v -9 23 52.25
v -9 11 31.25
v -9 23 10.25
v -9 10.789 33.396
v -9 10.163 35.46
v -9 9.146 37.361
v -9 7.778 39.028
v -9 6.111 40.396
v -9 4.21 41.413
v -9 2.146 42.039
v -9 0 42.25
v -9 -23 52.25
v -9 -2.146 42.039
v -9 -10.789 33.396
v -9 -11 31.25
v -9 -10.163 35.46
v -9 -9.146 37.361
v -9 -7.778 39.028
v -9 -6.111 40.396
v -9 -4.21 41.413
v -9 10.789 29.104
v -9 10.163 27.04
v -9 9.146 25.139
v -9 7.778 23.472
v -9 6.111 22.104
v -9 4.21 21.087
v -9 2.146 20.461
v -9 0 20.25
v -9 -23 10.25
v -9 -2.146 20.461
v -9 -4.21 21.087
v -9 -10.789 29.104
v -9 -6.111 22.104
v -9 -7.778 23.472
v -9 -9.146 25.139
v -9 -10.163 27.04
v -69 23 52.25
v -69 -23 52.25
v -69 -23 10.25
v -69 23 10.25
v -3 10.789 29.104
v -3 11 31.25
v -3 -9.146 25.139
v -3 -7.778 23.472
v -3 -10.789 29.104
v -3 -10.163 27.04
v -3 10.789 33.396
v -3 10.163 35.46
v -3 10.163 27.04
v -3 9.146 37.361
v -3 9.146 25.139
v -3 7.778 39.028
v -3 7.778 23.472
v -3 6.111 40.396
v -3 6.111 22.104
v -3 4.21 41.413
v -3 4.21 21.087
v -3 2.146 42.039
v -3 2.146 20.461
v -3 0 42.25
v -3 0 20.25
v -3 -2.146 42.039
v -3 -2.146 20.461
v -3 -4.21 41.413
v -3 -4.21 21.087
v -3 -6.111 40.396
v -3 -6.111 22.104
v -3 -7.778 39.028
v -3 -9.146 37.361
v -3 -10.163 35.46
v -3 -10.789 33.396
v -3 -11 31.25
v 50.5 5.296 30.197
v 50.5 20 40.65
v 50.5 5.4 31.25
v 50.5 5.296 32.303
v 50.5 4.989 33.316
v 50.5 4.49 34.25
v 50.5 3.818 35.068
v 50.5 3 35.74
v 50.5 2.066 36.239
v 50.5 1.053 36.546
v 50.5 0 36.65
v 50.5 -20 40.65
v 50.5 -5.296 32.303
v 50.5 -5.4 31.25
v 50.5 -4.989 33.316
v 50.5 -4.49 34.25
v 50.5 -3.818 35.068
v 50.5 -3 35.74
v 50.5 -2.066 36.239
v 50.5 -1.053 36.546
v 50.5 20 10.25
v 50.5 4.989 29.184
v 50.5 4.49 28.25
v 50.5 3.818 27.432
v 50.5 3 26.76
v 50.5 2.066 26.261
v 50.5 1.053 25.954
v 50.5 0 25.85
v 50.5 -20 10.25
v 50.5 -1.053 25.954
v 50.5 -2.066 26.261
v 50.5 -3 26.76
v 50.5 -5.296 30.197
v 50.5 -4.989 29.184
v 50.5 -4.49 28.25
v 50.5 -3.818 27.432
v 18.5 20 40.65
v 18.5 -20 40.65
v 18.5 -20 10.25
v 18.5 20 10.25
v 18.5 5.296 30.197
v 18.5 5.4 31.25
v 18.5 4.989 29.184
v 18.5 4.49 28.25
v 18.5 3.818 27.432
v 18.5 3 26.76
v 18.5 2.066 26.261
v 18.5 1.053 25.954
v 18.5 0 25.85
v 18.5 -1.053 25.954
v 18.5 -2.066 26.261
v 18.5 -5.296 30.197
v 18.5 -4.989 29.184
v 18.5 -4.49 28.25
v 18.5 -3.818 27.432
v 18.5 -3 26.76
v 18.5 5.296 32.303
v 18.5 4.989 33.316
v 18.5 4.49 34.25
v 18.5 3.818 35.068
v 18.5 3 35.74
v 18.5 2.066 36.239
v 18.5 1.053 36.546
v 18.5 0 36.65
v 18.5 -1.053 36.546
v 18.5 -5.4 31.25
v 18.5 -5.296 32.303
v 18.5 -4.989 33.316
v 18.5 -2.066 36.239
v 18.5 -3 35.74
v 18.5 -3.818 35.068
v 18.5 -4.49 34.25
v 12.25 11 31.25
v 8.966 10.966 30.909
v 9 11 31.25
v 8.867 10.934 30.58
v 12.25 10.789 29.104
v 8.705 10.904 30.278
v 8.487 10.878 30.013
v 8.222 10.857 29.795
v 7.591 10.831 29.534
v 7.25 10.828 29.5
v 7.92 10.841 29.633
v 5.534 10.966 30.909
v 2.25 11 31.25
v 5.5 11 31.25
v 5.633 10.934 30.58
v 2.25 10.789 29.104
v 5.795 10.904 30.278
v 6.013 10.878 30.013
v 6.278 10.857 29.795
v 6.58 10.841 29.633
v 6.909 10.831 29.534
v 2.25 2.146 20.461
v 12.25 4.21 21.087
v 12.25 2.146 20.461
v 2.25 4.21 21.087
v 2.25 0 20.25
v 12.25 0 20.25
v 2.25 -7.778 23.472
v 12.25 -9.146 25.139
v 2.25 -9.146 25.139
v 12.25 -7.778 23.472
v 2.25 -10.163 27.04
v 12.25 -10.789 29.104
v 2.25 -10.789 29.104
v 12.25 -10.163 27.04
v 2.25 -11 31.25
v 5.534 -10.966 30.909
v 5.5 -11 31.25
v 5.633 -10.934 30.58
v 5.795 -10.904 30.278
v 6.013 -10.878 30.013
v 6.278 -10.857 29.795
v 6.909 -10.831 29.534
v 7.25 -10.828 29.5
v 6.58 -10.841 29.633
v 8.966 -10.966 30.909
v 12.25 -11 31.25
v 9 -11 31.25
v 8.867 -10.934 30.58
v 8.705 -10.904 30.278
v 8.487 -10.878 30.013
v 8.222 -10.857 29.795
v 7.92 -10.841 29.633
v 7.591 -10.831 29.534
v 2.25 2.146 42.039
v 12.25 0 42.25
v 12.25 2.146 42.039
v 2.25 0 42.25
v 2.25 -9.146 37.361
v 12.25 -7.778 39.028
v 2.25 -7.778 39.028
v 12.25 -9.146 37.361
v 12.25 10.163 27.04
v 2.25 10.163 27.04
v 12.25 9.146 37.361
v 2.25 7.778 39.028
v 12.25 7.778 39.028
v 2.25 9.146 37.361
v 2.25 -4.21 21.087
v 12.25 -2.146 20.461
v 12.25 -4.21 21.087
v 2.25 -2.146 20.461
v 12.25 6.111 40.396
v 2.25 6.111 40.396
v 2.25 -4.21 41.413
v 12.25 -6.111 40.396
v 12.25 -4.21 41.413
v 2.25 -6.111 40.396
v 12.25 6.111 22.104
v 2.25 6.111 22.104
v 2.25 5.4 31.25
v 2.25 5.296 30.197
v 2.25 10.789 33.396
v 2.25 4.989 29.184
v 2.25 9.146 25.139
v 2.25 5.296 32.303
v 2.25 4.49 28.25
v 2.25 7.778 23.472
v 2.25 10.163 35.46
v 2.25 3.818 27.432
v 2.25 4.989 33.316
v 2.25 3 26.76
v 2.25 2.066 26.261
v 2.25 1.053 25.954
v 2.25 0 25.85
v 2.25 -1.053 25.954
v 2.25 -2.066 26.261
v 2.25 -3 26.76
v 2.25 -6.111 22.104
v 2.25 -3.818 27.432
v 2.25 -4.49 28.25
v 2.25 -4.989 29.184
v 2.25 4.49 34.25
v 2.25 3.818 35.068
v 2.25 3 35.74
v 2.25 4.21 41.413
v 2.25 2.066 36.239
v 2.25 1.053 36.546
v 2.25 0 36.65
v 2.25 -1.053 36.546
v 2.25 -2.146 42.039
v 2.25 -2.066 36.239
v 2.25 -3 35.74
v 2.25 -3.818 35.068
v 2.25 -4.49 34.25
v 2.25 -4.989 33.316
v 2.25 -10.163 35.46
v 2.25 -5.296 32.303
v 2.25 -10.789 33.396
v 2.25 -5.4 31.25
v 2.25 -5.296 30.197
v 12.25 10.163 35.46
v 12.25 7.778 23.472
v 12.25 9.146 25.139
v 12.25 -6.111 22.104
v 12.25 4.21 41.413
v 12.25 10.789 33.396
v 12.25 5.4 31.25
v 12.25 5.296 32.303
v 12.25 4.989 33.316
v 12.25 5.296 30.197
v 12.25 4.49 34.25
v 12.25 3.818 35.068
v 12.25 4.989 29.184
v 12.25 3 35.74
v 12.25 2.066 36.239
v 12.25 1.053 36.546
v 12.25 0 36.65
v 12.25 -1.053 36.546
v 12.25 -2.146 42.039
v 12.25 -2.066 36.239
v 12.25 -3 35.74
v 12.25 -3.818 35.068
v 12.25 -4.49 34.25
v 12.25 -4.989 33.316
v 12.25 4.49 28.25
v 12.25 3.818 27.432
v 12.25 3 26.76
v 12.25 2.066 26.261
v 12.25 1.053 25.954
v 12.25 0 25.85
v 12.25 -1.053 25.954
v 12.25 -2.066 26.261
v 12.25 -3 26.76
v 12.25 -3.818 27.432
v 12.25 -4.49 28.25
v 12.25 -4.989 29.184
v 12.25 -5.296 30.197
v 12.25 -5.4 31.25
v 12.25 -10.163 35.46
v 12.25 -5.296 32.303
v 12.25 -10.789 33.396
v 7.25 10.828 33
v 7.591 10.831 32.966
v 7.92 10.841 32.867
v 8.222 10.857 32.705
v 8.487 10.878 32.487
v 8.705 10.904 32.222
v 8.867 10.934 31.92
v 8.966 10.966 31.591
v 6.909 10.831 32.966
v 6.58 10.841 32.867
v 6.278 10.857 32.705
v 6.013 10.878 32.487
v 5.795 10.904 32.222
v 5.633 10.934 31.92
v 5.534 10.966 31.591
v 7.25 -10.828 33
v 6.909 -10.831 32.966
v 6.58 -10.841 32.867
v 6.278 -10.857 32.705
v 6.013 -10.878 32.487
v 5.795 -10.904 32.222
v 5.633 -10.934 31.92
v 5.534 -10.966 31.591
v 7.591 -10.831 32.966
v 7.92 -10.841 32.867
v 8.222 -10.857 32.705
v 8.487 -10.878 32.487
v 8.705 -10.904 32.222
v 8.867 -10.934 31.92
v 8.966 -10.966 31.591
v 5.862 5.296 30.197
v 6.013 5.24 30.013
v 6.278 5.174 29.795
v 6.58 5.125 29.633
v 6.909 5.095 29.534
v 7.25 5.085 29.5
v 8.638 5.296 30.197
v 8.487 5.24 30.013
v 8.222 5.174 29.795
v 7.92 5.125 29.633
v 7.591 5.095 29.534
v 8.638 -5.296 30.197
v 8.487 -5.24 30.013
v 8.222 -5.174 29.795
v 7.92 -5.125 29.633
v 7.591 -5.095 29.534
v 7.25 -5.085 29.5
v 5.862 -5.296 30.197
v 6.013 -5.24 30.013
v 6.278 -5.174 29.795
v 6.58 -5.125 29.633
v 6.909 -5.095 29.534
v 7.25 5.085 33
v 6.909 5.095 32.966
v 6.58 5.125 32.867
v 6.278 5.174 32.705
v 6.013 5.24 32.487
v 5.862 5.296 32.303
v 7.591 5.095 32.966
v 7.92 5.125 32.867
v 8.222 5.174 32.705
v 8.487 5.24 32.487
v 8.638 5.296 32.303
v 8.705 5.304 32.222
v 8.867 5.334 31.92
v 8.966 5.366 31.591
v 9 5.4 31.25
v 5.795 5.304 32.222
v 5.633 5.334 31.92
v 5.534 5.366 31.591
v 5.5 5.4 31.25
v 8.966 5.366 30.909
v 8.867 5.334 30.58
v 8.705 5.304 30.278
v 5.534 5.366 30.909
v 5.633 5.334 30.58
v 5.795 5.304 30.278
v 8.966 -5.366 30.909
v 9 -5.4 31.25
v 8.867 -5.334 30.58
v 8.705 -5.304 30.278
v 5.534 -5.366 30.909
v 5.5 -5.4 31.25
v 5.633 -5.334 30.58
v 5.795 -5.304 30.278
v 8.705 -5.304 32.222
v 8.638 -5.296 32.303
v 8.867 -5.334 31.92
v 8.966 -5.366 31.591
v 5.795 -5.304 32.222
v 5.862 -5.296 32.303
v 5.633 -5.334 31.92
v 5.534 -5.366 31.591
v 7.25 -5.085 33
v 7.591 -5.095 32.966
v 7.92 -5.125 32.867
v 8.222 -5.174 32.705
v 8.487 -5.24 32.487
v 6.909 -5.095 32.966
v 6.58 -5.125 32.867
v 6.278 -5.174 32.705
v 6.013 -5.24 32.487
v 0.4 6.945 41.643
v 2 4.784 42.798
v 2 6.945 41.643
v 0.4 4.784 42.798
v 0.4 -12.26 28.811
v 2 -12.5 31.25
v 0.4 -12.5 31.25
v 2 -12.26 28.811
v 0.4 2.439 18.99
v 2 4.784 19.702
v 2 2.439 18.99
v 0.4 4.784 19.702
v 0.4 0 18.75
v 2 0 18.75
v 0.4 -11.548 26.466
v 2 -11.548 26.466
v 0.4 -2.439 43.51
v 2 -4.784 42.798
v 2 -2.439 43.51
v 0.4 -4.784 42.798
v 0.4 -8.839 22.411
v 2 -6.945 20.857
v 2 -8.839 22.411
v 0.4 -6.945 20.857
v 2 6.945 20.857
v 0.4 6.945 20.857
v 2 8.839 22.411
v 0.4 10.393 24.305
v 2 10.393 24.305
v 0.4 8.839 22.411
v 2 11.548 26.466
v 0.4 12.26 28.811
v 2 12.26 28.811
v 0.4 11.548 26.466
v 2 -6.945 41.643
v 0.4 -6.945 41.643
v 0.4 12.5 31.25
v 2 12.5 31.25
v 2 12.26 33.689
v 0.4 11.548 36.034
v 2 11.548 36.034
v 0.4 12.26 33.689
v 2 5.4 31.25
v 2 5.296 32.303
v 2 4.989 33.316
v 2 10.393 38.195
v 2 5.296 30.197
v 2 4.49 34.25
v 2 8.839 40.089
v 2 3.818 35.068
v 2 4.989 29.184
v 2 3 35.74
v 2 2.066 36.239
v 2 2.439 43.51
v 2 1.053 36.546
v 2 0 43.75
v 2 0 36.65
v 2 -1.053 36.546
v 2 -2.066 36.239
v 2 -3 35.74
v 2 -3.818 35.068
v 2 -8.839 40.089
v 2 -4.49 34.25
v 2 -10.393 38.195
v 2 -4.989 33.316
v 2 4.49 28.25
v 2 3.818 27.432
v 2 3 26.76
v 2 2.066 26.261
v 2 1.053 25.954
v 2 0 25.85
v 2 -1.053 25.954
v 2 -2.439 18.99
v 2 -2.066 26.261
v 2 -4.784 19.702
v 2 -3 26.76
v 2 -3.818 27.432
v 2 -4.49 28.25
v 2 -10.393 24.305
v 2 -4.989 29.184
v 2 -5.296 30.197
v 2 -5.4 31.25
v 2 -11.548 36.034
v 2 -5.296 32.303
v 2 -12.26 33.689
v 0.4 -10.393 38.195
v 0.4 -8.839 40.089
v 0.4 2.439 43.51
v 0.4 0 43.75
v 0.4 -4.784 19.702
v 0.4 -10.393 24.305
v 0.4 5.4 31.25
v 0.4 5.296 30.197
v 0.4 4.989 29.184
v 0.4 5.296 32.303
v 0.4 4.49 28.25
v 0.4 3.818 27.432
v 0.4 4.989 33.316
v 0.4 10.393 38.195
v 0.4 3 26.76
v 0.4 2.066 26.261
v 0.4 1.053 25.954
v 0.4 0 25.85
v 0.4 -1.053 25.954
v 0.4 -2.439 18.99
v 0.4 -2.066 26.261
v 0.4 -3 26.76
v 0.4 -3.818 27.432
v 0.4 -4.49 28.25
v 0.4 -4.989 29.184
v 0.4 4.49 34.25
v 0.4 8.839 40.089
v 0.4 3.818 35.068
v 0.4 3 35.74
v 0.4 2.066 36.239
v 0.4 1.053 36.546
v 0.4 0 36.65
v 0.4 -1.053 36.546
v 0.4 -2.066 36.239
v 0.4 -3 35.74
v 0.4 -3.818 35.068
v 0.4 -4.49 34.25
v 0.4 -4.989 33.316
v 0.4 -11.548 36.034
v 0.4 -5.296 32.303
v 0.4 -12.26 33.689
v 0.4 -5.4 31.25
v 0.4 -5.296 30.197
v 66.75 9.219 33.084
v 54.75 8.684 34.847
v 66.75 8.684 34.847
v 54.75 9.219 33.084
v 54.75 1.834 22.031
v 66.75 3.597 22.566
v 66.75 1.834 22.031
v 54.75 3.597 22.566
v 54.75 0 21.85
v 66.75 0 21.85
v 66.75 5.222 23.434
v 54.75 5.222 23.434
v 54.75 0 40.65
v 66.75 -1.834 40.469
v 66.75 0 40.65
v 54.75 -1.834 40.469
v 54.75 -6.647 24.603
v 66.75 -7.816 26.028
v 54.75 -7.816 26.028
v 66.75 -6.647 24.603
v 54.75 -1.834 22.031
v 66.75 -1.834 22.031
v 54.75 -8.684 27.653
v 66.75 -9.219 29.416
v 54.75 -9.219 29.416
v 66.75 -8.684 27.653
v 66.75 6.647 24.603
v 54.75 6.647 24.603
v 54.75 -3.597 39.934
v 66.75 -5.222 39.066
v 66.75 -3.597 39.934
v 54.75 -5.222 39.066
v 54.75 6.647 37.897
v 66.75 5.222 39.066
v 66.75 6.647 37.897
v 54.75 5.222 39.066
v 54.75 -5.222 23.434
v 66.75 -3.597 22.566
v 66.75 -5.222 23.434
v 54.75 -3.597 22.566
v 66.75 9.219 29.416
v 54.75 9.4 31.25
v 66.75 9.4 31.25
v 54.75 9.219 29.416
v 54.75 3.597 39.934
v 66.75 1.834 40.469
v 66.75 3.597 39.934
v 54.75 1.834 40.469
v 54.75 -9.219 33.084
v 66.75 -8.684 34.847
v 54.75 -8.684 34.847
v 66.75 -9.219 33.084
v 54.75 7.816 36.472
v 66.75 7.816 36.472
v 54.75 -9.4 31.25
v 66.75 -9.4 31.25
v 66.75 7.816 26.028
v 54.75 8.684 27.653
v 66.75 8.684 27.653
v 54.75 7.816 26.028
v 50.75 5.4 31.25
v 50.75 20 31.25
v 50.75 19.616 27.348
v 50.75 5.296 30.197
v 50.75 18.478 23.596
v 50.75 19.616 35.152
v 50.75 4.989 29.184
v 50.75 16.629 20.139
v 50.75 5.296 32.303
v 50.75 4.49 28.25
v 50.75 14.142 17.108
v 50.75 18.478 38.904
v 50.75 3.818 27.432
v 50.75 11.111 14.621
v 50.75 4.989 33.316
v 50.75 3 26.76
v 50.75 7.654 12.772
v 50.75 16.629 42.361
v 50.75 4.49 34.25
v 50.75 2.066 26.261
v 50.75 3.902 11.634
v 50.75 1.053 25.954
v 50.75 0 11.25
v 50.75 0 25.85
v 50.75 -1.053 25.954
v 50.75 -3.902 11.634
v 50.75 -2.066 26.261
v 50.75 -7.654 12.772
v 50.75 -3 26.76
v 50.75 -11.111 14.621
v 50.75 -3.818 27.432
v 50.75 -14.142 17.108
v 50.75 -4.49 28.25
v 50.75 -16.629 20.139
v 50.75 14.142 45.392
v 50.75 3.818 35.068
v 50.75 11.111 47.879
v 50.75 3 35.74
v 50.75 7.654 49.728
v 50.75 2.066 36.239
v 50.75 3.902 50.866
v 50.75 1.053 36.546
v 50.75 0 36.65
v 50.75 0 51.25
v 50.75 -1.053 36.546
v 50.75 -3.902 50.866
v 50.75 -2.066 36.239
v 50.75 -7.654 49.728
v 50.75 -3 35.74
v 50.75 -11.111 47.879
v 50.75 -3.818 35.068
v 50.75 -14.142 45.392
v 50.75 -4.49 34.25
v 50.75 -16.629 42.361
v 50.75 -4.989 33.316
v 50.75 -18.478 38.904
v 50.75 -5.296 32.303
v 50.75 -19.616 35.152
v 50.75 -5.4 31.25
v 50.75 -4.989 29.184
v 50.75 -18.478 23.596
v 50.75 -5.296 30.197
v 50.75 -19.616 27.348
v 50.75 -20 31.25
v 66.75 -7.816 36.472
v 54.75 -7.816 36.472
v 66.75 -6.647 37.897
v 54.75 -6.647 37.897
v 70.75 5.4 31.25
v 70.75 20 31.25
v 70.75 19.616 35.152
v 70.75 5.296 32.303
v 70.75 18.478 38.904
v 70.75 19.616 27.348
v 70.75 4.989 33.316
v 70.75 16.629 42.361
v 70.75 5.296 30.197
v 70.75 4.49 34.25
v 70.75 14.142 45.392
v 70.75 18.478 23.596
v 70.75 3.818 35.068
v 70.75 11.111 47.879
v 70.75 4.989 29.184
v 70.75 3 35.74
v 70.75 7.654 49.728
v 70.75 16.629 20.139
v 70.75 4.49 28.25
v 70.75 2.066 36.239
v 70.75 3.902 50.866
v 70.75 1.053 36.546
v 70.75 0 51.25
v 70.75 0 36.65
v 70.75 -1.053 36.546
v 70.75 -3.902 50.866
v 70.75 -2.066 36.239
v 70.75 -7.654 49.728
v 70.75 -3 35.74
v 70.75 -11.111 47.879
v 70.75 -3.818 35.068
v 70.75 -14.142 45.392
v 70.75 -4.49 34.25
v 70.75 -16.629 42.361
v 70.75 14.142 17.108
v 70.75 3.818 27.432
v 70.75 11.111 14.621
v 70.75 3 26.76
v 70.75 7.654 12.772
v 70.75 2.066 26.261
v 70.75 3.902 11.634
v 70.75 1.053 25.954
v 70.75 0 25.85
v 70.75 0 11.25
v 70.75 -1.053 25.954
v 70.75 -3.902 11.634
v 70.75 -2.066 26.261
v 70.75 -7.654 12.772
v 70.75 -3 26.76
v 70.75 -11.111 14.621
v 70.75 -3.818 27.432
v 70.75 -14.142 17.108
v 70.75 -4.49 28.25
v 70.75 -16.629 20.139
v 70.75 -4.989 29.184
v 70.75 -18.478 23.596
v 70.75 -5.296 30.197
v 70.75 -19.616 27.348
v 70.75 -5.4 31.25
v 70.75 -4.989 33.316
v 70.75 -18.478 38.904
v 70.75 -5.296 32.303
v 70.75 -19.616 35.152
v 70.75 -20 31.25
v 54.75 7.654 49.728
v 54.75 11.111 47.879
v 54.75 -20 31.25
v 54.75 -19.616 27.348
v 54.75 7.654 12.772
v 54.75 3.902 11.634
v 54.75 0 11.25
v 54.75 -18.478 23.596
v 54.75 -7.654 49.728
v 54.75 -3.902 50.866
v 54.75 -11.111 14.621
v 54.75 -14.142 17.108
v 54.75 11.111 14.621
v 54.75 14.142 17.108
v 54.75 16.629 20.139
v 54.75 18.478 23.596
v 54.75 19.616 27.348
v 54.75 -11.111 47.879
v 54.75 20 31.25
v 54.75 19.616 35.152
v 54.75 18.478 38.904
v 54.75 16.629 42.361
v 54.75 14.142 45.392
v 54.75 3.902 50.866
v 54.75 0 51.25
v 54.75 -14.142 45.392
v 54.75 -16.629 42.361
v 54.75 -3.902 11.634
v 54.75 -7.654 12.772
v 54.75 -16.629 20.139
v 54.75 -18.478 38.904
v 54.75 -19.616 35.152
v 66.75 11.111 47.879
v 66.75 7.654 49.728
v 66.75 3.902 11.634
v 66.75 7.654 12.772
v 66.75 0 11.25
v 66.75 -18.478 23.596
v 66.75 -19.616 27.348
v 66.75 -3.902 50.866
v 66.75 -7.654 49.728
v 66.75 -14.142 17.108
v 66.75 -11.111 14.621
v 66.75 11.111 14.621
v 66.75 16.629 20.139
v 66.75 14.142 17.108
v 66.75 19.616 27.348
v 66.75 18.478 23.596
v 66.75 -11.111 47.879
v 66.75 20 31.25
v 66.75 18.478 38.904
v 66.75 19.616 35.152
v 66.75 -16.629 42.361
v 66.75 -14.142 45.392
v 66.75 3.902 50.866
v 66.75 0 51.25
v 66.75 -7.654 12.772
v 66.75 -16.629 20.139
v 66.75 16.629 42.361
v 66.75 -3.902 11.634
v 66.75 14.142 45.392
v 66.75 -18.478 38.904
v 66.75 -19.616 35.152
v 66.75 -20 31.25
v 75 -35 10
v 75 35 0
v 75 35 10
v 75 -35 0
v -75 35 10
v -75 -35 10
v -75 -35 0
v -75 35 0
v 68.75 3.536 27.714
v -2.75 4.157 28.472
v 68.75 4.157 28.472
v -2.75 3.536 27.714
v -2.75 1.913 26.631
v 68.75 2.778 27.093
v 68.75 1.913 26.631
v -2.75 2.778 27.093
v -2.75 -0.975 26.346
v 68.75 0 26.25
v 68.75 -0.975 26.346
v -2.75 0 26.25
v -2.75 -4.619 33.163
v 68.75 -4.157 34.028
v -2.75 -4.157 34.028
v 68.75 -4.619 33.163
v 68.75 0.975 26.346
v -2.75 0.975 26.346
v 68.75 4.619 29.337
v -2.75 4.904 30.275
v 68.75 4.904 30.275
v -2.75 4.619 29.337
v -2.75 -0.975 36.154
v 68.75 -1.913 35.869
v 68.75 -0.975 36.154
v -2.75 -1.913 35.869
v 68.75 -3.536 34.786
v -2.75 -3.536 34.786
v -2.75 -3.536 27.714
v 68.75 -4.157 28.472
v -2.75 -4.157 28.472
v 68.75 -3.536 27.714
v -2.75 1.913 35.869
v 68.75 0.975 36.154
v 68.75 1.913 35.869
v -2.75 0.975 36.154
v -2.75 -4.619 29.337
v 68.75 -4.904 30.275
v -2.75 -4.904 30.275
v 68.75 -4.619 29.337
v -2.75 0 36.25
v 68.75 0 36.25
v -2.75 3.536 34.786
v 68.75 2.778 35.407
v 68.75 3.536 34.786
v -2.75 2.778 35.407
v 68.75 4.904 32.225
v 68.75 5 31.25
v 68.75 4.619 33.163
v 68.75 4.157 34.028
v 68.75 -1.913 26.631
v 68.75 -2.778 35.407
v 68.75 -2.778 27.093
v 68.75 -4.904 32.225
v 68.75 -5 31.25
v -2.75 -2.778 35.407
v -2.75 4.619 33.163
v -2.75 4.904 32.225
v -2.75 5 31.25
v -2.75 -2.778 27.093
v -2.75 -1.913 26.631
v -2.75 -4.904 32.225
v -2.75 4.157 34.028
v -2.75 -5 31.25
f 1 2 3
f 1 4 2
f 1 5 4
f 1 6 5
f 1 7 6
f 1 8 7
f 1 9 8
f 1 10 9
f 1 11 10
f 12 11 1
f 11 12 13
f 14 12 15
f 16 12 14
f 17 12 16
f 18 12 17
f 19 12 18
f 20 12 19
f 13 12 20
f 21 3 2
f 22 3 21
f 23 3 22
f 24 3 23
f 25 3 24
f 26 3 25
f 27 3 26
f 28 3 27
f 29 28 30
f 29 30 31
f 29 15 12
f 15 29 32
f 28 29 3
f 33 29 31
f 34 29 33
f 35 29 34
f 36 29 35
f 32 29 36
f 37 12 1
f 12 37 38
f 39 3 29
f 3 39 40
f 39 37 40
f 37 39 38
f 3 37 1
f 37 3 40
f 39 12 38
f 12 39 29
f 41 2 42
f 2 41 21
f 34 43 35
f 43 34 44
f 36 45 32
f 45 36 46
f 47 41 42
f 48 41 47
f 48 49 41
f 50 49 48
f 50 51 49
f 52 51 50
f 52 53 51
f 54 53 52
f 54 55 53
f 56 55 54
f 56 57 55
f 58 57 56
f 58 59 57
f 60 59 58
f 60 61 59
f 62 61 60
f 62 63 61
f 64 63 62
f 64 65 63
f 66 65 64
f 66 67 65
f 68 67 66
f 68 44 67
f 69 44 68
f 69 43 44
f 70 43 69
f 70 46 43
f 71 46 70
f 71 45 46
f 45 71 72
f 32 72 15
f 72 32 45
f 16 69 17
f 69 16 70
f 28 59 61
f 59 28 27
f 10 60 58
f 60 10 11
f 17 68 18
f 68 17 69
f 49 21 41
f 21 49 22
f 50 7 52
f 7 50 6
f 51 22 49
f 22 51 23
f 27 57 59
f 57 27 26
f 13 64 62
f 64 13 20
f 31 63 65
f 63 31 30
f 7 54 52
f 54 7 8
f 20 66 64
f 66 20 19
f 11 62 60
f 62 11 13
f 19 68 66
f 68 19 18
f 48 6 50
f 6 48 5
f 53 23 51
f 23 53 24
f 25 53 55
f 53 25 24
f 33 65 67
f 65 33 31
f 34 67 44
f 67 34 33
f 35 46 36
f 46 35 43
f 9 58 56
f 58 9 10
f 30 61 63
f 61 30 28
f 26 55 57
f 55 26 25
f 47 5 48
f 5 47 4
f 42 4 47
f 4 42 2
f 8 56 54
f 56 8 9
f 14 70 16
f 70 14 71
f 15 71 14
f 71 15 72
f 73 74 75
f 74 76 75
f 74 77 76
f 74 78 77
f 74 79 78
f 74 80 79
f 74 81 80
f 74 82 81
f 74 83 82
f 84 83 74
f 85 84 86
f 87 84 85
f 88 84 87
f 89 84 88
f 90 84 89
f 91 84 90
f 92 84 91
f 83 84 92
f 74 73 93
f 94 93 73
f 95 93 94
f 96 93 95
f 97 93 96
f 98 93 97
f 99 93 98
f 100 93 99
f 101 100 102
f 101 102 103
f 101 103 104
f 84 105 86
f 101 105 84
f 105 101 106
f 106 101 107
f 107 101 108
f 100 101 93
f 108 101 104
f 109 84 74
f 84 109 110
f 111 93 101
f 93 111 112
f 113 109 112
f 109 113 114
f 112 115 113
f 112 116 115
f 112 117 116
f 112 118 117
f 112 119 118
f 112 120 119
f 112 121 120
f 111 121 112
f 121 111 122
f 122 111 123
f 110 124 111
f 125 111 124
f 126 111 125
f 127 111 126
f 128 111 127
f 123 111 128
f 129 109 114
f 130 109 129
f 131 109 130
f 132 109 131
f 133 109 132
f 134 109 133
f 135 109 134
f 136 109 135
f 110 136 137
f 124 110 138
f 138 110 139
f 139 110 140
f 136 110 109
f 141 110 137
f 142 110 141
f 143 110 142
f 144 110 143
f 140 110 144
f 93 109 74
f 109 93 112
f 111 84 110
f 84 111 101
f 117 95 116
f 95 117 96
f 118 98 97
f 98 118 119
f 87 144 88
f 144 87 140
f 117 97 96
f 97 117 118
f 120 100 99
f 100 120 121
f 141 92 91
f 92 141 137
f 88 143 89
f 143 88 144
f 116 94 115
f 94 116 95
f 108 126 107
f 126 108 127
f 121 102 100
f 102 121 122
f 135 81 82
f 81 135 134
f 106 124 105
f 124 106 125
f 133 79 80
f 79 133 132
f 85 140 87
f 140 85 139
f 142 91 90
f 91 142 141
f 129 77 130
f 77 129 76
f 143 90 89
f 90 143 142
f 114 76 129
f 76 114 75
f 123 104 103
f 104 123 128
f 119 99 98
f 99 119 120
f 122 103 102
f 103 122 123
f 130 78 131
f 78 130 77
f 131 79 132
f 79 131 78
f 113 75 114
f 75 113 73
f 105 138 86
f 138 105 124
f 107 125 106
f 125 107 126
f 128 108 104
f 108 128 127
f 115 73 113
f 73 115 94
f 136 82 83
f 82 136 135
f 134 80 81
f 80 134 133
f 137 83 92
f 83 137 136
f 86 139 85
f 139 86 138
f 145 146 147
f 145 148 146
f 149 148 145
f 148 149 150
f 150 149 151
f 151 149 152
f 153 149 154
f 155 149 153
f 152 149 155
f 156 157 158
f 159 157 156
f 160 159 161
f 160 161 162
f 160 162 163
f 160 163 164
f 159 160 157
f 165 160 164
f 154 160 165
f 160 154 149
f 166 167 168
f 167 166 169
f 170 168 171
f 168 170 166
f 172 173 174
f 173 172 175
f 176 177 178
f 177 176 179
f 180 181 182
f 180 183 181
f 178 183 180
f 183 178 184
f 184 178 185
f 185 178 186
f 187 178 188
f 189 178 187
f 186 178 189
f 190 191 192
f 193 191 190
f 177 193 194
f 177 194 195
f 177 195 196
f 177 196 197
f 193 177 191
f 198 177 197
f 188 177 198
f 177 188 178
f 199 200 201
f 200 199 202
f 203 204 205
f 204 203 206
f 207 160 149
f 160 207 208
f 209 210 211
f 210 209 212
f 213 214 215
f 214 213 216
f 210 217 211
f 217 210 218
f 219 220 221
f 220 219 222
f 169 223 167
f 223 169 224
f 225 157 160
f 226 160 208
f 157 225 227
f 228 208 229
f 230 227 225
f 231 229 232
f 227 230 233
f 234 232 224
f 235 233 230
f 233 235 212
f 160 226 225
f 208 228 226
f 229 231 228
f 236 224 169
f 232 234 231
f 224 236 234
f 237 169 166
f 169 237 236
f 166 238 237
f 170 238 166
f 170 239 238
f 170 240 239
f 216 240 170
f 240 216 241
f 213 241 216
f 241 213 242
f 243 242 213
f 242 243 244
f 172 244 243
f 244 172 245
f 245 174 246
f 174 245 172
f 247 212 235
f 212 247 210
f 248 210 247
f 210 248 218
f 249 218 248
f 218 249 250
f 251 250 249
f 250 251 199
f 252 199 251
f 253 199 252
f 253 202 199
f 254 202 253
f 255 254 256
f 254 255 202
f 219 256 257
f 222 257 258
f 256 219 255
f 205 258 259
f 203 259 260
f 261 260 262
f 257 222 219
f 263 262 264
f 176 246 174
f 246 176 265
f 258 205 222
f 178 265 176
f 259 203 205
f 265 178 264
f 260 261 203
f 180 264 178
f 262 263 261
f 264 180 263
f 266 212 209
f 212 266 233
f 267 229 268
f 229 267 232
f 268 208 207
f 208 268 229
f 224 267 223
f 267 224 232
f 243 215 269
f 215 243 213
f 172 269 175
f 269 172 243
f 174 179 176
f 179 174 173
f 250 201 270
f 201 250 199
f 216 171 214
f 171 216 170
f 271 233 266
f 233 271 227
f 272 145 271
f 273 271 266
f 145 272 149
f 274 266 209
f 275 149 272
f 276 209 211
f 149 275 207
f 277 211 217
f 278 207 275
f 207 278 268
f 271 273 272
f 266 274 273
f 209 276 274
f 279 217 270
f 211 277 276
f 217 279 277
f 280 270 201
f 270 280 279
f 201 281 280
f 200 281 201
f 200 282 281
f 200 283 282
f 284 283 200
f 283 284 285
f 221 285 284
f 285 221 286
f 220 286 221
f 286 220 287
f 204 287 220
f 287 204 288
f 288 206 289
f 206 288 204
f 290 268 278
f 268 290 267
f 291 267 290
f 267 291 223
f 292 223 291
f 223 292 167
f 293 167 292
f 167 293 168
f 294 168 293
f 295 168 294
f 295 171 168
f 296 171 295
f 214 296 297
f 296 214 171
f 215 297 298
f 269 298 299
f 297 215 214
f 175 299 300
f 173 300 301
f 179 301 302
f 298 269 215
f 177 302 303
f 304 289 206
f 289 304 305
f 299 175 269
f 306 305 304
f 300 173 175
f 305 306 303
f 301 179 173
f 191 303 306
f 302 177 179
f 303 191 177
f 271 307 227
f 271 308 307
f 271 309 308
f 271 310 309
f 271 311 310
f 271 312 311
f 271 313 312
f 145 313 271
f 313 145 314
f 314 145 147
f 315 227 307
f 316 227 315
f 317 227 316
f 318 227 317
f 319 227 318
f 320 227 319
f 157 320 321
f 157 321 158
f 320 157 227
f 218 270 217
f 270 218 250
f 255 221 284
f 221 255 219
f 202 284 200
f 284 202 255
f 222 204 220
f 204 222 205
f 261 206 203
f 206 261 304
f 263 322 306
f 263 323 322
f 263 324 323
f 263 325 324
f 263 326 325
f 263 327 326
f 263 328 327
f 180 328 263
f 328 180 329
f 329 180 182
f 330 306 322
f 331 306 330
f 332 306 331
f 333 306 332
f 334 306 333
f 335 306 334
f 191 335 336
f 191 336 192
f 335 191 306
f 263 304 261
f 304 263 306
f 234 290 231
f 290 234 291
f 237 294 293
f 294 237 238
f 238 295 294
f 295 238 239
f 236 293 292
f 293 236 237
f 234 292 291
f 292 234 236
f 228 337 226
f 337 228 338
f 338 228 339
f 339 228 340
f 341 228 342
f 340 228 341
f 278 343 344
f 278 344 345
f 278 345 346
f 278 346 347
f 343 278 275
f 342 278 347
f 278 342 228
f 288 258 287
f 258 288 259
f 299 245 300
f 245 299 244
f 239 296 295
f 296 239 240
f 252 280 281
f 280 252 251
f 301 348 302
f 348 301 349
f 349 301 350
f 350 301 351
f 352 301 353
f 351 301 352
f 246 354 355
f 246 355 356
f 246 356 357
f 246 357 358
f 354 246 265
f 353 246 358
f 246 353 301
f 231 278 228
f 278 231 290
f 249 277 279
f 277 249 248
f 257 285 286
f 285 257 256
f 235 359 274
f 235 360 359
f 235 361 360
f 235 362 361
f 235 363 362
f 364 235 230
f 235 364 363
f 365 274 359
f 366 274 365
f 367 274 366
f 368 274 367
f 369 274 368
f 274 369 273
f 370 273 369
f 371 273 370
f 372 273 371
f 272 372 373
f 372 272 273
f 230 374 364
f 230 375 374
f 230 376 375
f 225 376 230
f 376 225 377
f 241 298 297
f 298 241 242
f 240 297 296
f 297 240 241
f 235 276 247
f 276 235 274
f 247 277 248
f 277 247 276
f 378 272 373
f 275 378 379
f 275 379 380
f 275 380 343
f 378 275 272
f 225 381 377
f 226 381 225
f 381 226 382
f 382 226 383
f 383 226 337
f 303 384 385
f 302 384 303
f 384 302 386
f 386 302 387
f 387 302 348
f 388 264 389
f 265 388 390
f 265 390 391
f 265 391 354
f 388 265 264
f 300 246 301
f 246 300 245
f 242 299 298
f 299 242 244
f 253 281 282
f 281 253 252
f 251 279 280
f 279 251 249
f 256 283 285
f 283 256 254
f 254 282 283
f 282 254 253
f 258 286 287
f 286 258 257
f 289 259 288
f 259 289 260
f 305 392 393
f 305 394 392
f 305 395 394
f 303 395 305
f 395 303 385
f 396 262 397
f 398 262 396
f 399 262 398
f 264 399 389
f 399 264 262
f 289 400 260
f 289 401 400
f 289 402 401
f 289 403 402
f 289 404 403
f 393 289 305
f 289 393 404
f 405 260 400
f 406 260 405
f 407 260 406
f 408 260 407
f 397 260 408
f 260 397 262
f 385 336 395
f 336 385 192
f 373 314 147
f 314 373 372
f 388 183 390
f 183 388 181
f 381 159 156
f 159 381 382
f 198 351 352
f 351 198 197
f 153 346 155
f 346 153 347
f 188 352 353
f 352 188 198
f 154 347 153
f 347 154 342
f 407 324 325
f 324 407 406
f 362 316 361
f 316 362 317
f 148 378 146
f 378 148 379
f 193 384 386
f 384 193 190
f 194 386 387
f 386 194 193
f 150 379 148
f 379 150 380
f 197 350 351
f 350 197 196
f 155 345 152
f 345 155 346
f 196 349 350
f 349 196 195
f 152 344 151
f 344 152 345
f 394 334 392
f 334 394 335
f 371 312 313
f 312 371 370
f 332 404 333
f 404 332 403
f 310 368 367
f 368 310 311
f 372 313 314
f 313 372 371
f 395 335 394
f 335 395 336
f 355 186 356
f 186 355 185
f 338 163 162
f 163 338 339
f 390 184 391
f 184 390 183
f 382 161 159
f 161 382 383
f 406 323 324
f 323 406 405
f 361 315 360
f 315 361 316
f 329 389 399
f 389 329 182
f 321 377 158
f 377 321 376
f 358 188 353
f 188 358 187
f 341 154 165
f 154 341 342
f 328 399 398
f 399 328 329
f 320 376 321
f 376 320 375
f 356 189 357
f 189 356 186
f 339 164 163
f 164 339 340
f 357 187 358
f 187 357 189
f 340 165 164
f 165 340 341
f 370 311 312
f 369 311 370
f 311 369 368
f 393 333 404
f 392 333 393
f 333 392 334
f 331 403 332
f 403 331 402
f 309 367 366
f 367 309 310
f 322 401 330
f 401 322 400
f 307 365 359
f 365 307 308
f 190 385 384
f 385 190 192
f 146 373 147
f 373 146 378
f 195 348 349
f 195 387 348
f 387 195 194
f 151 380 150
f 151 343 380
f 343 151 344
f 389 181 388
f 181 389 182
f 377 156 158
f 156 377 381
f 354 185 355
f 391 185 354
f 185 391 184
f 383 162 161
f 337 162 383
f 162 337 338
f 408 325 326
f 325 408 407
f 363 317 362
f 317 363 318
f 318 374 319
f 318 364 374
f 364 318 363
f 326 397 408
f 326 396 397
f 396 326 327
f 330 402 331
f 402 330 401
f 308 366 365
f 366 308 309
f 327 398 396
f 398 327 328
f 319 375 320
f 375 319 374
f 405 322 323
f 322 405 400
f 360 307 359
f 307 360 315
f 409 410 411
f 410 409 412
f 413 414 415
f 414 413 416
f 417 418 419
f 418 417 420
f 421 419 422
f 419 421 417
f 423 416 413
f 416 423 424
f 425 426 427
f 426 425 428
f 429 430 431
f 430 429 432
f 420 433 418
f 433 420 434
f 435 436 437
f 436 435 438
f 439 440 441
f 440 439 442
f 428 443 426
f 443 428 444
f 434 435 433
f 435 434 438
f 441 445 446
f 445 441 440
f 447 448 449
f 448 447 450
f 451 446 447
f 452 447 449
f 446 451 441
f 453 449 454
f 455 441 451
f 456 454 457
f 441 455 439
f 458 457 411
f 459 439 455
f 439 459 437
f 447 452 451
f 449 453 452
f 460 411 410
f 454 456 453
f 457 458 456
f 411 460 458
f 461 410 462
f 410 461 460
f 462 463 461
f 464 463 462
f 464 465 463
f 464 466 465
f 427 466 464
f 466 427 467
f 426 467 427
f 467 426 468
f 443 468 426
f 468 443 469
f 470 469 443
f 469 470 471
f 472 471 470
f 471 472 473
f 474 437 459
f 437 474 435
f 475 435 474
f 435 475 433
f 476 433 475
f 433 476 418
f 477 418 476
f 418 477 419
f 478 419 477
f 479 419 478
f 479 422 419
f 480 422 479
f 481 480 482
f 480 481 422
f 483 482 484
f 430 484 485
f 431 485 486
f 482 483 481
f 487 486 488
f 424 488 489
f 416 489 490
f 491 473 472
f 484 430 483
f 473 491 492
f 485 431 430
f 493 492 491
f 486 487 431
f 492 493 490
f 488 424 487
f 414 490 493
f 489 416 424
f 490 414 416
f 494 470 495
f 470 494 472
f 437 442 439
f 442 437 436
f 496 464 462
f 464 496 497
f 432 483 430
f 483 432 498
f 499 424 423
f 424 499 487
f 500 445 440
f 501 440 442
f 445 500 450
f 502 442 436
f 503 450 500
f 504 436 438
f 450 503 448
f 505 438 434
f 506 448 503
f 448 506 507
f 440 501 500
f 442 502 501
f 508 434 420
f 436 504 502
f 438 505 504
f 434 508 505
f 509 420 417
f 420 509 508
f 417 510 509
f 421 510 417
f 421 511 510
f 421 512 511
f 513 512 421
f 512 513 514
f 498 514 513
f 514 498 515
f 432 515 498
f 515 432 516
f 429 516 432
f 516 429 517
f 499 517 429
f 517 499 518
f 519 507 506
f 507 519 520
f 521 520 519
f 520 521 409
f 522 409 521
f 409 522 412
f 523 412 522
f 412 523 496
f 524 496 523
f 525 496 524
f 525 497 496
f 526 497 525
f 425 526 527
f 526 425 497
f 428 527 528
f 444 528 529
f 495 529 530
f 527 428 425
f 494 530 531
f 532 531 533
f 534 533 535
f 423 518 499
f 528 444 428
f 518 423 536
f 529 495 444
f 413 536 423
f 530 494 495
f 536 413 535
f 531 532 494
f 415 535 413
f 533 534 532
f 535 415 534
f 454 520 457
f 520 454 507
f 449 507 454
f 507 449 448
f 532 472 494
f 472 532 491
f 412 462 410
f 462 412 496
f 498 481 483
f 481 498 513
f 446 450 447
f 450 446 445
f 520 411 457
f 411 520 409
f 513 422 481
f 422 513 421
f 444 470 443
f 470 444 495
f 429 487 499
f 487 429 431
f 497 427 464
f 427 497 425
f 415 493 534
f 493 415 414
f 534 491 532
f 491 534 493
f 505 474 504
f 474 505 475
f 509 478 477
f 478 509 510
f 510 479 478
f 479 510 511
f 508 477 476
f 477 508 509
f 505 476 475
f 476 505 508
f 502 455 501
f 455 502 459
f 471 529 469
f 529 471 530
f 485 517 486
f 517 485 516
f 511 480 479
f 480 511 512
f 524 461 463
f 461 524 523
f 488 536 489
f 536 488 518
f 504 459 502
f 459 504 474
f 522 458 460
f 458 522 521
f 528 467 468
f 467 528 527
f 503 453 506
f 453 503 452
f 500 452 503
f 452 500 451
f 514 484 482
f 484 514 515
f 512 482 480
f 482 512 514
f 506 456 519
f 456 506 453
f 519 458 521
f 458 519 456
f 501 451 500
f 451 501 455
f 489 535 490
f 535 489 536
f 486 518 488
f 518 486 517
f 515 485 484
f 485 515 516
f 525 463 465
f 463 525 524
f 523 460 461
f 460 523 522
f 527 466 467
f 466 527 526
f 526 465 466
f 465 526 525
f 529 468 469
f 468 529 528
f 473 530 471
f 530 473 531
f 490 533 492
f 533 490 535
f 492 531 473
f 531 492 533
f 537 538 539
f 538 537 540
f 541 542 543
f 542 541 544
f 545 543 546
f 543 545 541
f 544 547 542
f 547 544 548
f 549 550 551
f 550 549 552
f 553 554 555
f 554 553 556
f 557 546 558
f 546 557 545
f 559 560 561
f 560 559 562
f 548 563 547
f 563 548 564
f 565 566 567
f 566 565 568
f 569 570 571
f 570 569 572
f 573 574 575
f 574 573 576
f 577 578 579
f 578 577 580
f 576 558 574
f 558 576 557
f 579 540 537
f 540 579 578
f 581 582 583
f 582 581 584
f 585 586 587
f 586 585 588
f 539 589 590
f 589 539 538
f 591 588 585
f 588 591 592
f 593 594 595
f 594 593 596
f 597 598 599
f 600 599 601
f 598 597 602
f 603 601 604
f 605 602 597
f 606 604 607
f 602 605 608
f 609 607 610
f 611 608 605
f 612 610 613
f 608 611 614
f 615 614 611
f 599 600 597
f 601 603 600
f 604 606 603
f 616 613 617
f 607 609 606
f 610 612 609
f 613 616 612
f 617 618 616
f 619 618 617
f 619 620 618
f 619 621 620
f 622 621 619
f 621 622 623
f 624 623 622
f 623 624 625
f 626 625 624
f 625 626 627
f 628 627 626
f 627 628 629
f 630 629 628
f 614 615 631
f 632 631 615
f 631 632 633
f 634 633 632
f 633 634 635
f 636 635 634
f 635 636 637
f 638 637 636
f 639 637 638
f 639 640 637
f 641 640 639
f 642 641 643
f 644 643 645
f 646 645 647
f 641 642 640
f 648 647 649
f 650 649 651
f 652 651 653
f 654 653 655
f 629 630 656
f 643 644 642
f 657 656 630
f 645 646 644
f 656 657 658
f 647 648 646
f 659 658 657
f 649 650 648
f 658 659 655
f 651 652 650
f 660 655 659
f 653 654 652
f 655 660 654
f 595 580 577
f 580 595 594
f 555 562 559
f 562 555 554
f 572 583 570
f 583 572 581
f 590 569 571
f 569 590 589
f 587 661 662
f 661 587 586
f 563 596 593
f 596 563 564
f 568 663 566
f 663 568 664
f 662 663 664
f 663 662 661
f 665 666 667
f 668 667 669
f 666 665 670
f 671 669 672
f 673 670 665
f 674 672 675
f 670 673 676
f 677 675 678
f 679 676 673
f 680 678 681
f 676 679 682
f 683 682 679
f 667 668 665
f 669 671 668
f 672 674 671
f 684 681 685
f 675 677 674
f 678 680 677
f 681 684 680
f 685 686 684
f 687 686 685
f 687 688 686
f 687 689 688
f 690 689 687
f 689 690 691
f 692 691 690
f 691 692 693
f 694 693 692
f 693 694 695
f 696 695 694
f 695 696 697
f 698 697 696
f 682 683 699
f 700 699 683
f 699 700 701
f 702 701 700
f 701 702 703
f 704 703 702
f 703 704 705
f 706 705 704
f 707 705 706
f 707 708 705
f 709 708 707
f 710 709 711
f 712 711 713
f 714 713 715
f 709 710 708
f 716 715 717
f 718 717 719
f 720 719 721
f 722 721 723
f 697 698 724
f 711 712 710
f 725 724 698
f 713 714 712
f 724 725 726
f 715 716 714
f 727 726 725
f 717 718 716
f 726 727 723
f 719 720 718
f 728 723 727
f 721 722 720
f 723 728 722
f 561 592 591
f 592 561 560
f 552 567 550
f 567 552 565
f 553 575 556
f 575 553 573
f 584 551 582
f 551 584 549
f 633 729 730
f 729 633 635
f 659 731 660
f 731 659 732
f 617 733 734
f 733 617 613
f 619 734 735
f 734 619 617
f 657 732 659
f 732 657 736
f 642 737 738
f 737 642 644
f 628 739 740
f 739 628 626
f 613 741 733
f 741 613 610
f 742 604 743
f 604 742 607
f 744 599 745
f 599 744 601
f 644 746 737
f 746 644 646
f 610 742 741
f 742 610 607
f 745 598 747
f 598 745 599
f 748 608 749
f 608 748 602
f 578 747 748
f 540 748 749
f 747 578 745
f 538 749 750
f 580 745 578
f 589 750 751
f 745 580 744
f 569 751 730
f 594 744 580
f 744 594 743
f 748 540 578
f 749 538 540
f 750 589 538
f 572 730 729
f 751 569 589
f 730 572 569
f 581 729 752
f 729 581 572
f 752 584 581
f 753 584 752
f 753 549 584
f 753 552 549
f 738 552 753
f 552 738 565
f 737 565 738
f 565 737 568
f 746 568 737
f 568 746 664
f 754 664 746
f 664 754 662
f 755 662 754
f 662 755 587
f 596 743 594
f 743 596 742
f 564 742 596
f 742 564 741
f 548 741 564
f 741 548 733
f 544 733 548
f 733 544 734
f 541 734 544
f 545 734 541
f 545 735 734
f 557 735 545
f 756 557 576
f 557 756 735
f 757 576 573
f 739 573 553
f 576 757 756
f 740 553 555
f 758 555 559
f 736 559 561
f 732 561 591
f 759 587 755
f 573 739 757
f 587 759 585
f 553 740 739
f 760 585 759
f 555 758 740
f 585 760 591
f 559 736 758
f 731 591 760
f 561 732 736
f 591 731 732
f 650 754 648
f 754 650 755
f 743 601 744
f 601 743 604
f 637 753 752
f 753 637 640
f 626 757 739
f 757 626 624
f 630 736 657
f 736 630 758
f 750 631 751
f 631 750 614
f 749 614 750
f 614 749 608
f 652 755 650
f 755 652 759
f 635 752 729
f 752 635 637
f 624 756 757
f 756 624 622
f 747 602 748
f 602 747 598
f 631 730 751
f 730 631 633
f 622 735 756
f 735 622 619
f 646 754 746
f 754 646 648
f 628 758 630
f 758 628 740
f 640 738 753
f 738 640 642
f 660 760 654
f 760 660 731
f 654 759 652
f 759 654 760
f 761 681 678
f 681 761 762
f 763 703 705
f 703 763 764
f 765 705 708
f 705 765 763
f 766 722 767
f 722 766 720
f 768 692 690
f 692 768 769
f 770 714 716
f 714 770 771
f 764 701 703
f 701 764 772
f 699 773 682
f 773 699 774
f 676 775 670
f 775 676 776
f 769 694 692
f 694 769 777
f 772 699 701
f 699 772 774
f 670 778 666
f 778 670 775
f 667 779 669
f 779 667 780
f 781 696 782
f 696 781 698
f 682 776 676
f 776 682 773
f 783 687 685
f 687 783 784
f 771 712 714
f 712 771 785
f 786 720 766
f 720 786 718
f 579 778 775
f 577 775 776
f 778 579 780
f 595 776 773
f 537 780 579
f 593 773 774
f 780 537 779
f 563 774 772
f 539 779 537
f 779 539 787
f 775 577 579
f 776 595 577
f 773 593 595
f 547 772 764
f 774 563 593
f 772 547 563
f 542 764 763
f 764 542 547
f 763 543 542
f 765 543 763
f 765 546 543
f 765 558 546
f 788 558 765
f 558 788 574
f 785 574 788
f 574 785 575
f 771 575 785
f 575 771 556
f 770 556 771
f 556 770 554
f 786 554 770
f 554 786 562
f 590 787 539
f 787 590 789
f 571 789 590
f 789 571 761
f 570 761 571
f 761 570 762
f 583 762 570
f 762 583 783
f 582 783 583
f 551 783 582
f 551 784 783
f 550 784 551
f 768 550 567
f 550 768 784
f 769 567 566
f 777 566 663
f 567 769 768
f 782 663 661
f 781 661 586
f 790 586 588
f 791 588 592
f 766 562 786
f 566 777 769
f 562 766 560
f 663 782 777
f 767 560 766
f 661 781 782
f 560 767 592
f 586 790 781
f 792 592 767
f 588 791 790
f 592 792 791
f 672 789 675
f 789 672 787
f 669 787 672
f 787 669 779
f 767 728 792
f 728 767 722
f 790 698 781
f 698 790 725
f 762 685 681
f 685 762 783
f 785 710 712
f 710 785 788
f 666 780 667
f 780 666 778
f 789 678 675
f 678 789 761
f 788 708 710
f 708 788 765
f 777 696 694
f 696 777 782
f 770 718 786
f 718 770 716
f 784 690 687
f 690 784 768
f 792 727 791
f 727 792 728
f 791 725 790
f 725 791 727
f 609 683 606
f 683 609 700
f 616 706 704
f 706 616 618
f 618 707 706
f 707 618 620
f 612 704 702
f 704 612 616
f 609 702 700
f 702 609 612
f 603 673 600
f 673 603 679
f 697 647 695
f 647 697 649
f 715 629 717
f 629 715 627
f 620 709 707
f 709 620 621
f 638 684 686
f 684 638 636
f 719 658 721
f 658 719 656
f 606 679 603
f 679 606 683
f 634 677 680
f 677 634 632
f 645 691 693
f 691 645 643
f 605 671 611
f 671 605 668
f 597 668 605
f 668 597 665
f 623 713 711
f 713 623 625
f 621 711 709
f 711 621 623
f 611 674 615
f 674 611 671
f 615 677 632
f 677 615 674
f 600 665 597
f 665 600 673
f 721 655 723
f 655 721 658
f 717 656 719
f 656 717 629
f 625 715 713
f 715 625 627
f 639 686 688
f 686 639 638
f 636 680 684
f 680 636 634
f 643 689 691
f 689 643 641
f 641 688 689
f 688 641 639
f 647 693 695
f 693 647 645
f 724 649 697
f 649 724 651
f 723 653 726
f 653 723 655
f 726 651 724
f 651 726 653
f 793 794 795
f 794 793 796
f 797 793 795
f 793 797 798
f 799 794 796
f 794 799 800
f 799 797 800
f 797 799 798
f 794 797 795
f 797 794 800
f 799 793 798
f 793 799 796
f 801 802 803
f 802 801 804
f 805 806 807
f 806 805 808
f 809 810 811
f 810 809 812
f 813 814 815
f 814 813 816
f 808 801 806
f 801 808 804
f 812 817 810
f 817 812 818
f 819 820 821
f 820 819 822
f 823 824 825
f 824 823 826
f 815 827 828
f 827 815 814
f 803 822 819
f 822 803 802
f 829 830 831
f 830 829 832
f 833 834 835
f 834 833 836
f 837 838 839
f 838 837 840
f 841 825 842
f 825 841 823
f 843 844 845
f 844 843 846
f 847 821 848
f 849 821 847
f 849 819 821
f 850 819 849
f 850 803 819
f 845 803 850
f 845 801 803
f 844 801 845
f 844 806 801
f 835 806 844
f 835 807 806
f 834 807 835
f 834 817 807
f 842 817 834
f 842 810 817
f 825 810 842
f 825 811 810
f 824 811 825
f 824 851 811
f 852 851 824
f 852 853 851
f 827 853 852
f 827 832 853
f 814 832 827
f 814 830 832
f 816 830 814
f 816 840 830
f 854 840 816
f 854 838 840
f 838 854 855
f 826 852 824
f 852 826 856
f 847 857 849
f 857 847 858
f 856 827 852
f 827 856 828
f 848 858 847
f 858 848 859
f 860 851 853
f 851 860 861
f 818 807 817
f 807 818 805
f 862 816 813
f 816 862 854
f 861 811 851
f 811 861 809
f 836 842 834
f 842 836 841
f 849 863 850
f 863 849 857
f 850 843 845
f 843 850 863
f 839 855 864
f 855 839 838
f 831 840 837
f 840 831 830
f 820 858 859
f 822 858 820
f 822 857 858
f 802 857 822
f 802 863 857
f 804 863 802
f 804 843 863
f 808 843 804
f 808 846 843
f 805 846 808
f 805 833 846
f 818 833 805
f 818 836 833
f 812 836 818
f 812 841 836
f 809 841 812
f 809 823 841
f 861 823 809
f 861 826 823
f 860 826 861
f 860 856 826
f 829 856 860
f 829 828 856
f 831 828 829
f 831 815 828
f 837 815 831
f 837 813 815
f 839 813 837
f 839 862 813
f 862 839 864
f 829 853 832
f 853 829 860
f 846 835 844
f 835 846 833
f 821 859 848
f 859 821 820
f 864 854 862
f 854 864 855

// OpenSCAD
$fn = 32;

// ------------------------------------------------------------------------
// Motor drive station: motor 60 x 42 mm, shaft d10, pulley d40
// Every part is its own module, assembly() places every instance.
// ------------------------------------------------------------------------

// --- part 1 ---
module station_bed() {
  difference() {
    translate([-75, -35, 0]) cube([150, 70, 10]);
  }
}

// --- part 2 ---
module drive_motor() {
  union() {
    translate([-30, -23, 0]) cube([60, 46, 42]);
    translate([33, 0, 21]) rotate([0, 90, 0]) cylinder(h = 6, d = 22, center = true);
  }
}

// --- part 3 ---
module pillow_block() {
  difference() {
    translate([-16, -20, 0]) cube([32, 40, 30.4]);
    translate([0, 0, 21]) rotate([0, 90, 0]) cylinder(h = 34, d = 10.8, center = true);
  }
}

// --- part 4 ---
module drive_shaft() {
  translate([0, 0, -35.75]) cylinder(h = 71.5, d = 10);
}

// --- part 5 ---
module shaft_collar() {
  difference() {
    cylinder(h = 10, d = 22);
    translate([0, 0, -1]) cylinder(h = 12, d = 10.8);
    translate([0, 0, 5]) rotate([90, 0, 0]) cylinder(h = 24, d = 3.5, center = true);
  }
}

// --- part 6 ---
module collar_washer() {
  difference() {
      translate([0, 0, 0]) cylinder(h = 1.6, d = 25);
      translate([0, 0, -1]) cylinder(h = 3.6, d = 10.8);
    }
}

// --- part 7 ---
module drive_pulley() {
  difference() {
    union() {
      cylinder(h = 20, d = 18.8);
      cylinder(h = 4, d = 40);
      translate([0, 0, 16]) cylinder(h = 4, d = 40);
    }
    translate([0, 0, -1]) cylinder(h = 22, d = 10.8);
  }
}

// --- assembly ---
module assembly() {
  color([0.80, 0.24, 0.20]) translate([0, 0, 0]) rotate([0, 0, 0]) station_bed();
  color([0.20, 0.45, 0.75]) translate([-39, 0, 10.25]) rotate([0, 0, 0]) drive_motor();
  color([0.25, 0.62, 0.32]) translate([34.5, 0, 10.25]) rotate([0, 0, 0]) pillow_block();
  color([0.92, 0.70, 0.18]) translate([33, 0, 31.25]) rotate([0, 90, 0]) drive_shaft();
  color([0.58, 0.35, 0.70]) translate([2.25, 0, 31.25]) rotate([0, 90, 0]) shaft_collar();
  color([0.16, 0.66, 0.66]) translate([0.4, 0, 31.25]) rotate([0, 90, 0]) collar_washer();
  color([0.85, 0.48, 0.18]) translate([50.75, 0, 31.25]) rotate([0, 90, 0]) drive_pulley();
}

assembly();
